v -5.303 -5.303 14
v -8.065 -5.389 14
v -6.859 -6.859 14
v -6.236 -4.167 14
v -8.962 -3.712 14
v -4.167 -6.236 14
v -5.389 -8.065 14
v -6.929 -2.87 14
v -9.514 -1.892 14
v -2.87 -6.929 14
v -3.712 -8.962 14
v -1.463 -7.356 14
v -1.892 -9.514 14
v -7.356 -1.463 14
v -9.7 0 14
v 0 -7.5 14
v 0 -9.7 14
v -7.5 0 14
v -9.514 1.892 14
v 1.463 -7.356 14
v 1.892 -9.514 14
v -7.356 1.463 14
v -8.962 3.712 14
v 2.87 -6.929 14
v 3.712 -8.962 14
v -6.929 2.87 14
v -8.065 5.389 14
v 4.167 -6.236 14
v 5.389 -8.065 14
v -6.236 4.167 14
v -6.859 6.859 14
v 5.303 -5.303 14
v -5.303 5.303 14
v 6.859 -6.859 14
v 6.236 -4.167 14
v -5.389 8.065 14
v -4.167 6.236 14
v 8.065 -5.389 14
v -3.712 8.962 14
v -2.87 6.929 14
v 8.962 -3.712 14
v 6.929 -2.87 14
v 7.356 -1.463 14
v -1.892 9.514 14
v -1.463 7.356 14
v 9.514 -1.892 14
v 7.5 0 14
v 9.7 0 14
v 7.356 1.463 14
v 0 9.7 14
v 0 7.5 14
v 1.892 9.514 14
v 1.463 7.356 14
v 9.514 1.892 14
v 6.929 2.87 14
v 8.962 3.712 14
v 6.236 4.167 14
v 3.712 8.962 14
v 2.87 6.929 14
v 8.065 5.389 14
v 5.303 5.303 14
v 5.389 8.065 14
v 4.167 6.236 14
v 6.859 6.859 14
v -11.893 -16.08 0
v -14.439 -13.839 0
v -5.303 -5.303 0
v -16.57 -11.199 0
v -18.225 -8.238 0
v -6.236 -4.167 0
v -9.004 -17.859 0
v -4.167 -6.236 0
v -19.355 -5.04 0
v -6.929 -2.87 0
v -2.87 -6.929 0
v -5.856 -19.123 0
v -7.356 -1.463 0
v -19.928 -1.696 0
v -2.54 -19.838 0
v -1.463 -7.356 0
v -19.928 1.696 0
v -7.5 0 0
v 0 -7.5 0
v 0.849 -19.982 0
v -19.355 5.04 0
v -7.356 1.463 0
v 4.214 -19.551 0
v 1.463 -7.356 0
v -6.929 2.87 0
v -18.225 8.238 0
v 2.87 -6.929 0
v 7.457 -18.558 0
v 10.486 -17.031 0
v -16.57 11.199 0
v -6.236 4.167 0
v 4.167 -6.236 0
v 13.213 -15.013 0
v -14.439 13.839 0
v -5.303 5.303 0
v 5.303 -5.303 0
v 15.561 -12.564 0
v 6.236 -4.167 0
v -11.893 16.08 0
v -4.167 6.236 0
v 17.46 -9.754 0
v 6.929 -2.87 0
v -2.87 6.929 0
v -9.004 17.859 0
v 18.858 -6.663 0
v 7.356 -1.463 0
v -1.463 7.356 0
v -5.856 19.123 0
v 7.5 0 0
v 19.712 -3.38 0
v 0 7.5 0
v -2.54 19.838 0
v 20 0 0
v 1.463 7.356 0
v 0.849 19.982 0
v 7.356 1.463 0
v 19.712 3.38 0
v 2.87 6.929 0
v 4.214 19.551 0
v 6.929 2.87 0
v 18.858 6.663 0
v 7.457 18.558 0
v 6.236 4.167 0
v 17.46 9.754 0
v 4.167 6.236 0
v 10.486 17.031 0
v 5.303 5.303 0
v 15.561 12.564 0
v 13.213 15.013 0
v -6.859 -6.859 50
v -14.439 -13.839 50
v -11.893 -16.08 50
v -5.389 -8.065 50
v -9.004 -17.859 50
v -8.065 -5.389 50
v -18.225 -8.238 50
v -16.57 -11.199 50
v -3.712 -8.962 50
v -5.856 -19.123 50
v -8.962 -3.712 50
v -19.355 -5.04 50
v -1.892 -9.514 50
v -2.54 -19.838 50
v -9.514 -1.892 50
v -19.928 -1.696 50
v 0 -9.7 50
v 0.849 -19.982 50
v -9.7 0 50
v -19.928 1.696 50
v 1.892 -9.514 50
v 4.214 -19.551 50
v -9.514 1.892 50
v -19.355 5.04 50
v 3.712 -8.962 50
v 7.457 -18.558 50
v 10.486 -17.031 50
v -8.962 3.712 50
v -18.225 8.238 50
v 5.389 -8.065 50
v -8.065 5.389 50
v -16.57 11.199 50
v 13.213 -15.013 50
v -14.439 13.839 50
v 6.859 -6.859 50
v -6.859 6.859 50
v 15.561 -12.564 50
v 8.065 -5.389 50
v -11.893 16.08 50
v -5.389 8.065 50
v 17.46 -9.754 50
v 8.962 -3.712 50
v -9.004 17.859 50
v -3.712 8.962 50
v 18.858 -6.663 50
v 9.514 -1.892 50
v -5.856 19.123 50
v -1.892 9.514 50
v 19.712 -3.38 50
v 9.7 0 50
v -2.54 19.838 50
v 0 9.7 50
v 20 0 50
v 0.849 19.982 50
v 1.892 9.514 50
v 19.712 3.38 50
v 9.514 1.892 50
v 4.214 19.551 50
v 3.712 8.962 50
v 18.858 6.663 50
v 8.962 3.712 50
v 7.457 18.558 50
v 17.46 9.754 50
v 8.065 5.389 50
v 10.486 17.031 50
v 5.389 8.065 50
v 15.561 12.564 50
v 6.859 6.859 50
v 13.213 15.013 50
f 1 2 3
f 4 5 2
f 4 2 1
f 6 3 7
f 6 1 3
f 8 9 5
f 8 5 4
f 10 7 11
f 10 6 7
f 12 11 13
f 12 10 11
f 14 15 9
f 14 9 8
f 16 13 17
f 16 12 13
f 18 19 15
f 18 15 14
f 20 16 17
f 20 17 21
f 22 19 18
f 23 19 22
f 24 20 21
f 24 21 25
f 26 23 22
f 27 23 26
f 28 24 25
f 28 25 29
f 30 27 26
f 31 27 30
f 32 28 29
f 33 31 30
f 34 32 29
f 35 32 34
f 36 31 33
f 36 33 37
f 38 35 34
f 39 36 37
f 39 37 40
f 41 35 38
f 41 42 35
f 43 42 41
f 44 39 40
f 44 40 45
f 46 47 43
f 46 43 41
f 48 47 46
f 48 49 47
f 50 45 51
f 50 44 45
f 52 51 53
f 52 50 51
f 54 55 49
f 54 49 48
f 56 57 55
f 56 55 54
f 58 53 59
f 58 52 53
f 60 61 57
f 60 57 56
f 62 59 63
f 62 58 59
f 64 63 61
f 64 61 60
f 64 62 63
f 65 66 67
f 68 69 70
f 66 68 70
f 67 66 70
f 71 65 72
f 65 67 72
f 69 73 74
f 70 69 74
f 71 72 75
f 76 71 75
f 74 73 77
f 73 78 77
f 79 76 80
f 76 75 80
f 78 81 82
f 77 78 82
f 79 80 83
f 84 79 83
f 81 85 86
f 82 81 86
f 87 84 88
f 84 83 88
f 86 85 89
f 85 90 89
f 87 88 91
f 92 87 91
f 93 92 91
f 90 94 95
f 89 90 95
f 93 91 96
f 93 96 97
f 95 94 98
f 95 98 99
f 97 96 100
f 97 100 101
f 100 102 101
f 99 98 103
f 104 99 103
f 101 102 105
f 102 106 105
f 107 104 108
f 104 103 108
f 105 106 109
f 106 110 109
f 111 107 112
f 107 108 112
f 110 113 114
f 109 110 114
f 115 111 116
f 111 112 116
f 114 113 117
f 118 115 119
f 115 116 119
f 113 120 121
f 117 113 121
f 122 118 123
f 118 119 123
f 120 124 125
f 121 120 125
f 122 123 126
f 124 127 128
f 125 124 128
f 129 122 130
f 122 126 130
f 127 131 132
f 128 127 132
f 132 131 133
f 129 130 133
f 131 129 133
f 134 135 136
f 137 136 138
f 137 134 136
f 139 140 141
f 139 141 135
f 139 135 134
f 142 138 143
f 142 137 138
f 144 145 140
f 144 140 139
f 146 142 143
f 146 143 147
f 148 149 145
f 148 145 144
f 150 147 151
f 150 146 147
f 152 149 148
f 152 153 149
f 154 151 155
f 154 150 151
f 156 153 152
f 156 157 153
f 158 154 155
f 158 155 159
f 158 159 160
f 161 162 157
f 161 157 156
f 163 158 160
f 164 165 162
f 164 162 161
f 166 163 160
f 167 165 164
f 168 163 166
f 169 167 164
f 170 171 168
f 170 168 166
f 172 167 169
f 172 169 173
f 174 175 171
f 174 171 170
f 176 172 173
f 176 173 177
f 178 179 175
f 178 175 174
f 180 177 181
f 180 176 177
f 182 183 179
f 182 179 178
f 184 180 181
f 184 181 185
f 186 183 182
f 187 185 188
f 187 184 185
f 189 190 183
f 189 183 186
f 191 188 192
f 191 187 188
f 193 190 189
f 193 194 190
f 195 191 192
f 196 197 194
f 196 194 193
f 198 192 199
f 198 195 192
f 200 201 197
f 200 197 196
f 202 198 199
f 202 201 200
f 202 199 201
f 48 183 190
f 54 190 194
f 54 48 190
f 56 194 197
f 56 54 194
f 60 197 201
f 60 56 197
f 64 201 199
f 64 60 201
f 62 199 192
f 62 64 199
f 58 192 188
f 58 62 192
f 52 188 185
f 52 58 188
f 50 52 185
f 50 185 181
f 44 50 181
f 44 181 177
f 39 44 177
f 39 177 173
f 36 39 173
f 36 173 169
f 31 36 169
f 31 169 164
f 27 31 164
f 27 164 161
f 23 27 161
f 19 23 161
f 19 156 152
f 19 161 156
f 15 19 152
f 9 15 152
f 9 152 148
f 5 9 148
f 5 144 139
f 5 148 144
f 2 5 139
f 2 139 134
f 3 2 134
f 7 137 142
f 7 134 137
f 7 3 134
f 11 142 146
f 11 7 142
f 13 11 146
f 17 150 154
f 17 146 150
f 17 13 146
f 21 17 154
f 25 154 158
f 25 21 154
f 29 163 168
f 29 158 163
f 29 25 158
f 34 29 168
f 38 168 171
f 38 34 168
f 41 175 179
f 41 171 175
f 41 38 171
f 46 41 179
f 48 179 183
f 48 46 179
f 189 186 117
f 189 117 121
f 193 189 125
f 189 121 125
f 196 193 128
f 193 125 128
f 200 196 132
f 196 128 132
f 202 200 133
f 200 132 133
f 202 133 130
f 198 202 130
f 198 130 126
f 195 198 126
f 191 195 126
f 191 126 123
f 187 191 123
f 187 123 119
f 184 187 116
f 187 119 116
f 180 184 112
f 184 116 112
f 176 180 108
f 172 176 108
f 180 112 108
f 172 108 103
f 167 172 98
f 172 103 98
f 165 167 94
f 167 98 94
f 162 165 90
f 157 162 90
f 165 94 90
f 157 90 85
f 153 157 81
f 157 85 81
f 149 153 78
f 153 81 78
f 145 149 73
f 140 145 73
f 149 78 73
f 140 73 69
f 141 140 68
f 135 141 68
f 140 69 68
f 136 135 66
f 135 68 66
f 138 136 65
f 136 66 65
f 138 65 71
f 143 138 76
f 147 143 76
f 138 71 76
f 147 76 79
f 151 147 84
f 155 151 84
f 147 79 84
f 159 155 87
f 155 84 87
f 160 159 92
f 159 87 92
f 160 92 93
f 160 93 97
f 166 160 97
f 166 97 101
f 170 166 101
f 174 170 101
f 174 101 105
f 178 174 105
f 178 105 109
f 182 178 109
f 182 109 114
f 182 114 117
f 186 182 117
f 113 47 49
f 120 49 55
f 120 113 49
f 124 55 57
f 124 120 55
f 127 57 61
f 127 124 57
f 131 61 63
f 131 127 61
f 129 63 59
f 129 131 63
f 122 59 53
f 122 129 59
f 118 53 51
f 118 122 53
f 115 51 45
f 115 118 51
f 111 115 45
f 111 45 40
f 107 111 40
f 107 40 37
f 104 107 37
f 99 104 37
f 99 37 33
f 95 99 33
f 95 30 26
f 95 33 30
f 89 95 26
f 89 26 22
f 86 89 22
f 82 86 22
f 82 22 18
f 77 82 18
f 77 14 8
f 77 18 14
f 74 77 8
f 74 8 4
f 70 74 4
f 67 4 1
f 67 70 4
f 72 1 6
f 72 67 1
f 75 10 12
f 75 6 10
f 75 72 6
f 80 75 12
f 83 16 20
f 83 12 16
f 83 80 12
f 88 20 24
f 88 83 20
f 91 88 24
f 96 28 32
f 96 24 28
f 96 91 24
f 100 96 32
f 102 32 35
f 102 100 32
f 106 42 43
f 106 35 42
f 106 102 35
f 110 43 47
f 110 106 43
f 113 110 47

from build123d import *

# Parameters (mm, degrees)
CYLINDER_R     = 9.7
CYLINDER_DEPTH = 50
TUBE_R         = 20
TUBE_R_2       = 7.5
TUBE_DEPTH     = 50


with BuildPart() as bearing_hole_cutter:
    # Cylinder → Cylinder (new body)
    with BuildSketch(Plane.XY.offset(14)):
        Circle(CYLINDER_R)
    extrude(amount=CYLINDER_DEPTH)


with BuildPart() as cut:
    # Tube → Tube (new body)
    with BuildSketch(Plane.XY):
        Circle(TUBE_R)
        Circle(TUBE_R_2, mode=Mode.SUBTRACT)
    extrude(amount=TUBE_DEPTH)

    # Cut: cut Bearing Hole cutter
    add(bearing_hole_cutter.part, mode=Mode.SUBTRACT)


solid = cut.part
